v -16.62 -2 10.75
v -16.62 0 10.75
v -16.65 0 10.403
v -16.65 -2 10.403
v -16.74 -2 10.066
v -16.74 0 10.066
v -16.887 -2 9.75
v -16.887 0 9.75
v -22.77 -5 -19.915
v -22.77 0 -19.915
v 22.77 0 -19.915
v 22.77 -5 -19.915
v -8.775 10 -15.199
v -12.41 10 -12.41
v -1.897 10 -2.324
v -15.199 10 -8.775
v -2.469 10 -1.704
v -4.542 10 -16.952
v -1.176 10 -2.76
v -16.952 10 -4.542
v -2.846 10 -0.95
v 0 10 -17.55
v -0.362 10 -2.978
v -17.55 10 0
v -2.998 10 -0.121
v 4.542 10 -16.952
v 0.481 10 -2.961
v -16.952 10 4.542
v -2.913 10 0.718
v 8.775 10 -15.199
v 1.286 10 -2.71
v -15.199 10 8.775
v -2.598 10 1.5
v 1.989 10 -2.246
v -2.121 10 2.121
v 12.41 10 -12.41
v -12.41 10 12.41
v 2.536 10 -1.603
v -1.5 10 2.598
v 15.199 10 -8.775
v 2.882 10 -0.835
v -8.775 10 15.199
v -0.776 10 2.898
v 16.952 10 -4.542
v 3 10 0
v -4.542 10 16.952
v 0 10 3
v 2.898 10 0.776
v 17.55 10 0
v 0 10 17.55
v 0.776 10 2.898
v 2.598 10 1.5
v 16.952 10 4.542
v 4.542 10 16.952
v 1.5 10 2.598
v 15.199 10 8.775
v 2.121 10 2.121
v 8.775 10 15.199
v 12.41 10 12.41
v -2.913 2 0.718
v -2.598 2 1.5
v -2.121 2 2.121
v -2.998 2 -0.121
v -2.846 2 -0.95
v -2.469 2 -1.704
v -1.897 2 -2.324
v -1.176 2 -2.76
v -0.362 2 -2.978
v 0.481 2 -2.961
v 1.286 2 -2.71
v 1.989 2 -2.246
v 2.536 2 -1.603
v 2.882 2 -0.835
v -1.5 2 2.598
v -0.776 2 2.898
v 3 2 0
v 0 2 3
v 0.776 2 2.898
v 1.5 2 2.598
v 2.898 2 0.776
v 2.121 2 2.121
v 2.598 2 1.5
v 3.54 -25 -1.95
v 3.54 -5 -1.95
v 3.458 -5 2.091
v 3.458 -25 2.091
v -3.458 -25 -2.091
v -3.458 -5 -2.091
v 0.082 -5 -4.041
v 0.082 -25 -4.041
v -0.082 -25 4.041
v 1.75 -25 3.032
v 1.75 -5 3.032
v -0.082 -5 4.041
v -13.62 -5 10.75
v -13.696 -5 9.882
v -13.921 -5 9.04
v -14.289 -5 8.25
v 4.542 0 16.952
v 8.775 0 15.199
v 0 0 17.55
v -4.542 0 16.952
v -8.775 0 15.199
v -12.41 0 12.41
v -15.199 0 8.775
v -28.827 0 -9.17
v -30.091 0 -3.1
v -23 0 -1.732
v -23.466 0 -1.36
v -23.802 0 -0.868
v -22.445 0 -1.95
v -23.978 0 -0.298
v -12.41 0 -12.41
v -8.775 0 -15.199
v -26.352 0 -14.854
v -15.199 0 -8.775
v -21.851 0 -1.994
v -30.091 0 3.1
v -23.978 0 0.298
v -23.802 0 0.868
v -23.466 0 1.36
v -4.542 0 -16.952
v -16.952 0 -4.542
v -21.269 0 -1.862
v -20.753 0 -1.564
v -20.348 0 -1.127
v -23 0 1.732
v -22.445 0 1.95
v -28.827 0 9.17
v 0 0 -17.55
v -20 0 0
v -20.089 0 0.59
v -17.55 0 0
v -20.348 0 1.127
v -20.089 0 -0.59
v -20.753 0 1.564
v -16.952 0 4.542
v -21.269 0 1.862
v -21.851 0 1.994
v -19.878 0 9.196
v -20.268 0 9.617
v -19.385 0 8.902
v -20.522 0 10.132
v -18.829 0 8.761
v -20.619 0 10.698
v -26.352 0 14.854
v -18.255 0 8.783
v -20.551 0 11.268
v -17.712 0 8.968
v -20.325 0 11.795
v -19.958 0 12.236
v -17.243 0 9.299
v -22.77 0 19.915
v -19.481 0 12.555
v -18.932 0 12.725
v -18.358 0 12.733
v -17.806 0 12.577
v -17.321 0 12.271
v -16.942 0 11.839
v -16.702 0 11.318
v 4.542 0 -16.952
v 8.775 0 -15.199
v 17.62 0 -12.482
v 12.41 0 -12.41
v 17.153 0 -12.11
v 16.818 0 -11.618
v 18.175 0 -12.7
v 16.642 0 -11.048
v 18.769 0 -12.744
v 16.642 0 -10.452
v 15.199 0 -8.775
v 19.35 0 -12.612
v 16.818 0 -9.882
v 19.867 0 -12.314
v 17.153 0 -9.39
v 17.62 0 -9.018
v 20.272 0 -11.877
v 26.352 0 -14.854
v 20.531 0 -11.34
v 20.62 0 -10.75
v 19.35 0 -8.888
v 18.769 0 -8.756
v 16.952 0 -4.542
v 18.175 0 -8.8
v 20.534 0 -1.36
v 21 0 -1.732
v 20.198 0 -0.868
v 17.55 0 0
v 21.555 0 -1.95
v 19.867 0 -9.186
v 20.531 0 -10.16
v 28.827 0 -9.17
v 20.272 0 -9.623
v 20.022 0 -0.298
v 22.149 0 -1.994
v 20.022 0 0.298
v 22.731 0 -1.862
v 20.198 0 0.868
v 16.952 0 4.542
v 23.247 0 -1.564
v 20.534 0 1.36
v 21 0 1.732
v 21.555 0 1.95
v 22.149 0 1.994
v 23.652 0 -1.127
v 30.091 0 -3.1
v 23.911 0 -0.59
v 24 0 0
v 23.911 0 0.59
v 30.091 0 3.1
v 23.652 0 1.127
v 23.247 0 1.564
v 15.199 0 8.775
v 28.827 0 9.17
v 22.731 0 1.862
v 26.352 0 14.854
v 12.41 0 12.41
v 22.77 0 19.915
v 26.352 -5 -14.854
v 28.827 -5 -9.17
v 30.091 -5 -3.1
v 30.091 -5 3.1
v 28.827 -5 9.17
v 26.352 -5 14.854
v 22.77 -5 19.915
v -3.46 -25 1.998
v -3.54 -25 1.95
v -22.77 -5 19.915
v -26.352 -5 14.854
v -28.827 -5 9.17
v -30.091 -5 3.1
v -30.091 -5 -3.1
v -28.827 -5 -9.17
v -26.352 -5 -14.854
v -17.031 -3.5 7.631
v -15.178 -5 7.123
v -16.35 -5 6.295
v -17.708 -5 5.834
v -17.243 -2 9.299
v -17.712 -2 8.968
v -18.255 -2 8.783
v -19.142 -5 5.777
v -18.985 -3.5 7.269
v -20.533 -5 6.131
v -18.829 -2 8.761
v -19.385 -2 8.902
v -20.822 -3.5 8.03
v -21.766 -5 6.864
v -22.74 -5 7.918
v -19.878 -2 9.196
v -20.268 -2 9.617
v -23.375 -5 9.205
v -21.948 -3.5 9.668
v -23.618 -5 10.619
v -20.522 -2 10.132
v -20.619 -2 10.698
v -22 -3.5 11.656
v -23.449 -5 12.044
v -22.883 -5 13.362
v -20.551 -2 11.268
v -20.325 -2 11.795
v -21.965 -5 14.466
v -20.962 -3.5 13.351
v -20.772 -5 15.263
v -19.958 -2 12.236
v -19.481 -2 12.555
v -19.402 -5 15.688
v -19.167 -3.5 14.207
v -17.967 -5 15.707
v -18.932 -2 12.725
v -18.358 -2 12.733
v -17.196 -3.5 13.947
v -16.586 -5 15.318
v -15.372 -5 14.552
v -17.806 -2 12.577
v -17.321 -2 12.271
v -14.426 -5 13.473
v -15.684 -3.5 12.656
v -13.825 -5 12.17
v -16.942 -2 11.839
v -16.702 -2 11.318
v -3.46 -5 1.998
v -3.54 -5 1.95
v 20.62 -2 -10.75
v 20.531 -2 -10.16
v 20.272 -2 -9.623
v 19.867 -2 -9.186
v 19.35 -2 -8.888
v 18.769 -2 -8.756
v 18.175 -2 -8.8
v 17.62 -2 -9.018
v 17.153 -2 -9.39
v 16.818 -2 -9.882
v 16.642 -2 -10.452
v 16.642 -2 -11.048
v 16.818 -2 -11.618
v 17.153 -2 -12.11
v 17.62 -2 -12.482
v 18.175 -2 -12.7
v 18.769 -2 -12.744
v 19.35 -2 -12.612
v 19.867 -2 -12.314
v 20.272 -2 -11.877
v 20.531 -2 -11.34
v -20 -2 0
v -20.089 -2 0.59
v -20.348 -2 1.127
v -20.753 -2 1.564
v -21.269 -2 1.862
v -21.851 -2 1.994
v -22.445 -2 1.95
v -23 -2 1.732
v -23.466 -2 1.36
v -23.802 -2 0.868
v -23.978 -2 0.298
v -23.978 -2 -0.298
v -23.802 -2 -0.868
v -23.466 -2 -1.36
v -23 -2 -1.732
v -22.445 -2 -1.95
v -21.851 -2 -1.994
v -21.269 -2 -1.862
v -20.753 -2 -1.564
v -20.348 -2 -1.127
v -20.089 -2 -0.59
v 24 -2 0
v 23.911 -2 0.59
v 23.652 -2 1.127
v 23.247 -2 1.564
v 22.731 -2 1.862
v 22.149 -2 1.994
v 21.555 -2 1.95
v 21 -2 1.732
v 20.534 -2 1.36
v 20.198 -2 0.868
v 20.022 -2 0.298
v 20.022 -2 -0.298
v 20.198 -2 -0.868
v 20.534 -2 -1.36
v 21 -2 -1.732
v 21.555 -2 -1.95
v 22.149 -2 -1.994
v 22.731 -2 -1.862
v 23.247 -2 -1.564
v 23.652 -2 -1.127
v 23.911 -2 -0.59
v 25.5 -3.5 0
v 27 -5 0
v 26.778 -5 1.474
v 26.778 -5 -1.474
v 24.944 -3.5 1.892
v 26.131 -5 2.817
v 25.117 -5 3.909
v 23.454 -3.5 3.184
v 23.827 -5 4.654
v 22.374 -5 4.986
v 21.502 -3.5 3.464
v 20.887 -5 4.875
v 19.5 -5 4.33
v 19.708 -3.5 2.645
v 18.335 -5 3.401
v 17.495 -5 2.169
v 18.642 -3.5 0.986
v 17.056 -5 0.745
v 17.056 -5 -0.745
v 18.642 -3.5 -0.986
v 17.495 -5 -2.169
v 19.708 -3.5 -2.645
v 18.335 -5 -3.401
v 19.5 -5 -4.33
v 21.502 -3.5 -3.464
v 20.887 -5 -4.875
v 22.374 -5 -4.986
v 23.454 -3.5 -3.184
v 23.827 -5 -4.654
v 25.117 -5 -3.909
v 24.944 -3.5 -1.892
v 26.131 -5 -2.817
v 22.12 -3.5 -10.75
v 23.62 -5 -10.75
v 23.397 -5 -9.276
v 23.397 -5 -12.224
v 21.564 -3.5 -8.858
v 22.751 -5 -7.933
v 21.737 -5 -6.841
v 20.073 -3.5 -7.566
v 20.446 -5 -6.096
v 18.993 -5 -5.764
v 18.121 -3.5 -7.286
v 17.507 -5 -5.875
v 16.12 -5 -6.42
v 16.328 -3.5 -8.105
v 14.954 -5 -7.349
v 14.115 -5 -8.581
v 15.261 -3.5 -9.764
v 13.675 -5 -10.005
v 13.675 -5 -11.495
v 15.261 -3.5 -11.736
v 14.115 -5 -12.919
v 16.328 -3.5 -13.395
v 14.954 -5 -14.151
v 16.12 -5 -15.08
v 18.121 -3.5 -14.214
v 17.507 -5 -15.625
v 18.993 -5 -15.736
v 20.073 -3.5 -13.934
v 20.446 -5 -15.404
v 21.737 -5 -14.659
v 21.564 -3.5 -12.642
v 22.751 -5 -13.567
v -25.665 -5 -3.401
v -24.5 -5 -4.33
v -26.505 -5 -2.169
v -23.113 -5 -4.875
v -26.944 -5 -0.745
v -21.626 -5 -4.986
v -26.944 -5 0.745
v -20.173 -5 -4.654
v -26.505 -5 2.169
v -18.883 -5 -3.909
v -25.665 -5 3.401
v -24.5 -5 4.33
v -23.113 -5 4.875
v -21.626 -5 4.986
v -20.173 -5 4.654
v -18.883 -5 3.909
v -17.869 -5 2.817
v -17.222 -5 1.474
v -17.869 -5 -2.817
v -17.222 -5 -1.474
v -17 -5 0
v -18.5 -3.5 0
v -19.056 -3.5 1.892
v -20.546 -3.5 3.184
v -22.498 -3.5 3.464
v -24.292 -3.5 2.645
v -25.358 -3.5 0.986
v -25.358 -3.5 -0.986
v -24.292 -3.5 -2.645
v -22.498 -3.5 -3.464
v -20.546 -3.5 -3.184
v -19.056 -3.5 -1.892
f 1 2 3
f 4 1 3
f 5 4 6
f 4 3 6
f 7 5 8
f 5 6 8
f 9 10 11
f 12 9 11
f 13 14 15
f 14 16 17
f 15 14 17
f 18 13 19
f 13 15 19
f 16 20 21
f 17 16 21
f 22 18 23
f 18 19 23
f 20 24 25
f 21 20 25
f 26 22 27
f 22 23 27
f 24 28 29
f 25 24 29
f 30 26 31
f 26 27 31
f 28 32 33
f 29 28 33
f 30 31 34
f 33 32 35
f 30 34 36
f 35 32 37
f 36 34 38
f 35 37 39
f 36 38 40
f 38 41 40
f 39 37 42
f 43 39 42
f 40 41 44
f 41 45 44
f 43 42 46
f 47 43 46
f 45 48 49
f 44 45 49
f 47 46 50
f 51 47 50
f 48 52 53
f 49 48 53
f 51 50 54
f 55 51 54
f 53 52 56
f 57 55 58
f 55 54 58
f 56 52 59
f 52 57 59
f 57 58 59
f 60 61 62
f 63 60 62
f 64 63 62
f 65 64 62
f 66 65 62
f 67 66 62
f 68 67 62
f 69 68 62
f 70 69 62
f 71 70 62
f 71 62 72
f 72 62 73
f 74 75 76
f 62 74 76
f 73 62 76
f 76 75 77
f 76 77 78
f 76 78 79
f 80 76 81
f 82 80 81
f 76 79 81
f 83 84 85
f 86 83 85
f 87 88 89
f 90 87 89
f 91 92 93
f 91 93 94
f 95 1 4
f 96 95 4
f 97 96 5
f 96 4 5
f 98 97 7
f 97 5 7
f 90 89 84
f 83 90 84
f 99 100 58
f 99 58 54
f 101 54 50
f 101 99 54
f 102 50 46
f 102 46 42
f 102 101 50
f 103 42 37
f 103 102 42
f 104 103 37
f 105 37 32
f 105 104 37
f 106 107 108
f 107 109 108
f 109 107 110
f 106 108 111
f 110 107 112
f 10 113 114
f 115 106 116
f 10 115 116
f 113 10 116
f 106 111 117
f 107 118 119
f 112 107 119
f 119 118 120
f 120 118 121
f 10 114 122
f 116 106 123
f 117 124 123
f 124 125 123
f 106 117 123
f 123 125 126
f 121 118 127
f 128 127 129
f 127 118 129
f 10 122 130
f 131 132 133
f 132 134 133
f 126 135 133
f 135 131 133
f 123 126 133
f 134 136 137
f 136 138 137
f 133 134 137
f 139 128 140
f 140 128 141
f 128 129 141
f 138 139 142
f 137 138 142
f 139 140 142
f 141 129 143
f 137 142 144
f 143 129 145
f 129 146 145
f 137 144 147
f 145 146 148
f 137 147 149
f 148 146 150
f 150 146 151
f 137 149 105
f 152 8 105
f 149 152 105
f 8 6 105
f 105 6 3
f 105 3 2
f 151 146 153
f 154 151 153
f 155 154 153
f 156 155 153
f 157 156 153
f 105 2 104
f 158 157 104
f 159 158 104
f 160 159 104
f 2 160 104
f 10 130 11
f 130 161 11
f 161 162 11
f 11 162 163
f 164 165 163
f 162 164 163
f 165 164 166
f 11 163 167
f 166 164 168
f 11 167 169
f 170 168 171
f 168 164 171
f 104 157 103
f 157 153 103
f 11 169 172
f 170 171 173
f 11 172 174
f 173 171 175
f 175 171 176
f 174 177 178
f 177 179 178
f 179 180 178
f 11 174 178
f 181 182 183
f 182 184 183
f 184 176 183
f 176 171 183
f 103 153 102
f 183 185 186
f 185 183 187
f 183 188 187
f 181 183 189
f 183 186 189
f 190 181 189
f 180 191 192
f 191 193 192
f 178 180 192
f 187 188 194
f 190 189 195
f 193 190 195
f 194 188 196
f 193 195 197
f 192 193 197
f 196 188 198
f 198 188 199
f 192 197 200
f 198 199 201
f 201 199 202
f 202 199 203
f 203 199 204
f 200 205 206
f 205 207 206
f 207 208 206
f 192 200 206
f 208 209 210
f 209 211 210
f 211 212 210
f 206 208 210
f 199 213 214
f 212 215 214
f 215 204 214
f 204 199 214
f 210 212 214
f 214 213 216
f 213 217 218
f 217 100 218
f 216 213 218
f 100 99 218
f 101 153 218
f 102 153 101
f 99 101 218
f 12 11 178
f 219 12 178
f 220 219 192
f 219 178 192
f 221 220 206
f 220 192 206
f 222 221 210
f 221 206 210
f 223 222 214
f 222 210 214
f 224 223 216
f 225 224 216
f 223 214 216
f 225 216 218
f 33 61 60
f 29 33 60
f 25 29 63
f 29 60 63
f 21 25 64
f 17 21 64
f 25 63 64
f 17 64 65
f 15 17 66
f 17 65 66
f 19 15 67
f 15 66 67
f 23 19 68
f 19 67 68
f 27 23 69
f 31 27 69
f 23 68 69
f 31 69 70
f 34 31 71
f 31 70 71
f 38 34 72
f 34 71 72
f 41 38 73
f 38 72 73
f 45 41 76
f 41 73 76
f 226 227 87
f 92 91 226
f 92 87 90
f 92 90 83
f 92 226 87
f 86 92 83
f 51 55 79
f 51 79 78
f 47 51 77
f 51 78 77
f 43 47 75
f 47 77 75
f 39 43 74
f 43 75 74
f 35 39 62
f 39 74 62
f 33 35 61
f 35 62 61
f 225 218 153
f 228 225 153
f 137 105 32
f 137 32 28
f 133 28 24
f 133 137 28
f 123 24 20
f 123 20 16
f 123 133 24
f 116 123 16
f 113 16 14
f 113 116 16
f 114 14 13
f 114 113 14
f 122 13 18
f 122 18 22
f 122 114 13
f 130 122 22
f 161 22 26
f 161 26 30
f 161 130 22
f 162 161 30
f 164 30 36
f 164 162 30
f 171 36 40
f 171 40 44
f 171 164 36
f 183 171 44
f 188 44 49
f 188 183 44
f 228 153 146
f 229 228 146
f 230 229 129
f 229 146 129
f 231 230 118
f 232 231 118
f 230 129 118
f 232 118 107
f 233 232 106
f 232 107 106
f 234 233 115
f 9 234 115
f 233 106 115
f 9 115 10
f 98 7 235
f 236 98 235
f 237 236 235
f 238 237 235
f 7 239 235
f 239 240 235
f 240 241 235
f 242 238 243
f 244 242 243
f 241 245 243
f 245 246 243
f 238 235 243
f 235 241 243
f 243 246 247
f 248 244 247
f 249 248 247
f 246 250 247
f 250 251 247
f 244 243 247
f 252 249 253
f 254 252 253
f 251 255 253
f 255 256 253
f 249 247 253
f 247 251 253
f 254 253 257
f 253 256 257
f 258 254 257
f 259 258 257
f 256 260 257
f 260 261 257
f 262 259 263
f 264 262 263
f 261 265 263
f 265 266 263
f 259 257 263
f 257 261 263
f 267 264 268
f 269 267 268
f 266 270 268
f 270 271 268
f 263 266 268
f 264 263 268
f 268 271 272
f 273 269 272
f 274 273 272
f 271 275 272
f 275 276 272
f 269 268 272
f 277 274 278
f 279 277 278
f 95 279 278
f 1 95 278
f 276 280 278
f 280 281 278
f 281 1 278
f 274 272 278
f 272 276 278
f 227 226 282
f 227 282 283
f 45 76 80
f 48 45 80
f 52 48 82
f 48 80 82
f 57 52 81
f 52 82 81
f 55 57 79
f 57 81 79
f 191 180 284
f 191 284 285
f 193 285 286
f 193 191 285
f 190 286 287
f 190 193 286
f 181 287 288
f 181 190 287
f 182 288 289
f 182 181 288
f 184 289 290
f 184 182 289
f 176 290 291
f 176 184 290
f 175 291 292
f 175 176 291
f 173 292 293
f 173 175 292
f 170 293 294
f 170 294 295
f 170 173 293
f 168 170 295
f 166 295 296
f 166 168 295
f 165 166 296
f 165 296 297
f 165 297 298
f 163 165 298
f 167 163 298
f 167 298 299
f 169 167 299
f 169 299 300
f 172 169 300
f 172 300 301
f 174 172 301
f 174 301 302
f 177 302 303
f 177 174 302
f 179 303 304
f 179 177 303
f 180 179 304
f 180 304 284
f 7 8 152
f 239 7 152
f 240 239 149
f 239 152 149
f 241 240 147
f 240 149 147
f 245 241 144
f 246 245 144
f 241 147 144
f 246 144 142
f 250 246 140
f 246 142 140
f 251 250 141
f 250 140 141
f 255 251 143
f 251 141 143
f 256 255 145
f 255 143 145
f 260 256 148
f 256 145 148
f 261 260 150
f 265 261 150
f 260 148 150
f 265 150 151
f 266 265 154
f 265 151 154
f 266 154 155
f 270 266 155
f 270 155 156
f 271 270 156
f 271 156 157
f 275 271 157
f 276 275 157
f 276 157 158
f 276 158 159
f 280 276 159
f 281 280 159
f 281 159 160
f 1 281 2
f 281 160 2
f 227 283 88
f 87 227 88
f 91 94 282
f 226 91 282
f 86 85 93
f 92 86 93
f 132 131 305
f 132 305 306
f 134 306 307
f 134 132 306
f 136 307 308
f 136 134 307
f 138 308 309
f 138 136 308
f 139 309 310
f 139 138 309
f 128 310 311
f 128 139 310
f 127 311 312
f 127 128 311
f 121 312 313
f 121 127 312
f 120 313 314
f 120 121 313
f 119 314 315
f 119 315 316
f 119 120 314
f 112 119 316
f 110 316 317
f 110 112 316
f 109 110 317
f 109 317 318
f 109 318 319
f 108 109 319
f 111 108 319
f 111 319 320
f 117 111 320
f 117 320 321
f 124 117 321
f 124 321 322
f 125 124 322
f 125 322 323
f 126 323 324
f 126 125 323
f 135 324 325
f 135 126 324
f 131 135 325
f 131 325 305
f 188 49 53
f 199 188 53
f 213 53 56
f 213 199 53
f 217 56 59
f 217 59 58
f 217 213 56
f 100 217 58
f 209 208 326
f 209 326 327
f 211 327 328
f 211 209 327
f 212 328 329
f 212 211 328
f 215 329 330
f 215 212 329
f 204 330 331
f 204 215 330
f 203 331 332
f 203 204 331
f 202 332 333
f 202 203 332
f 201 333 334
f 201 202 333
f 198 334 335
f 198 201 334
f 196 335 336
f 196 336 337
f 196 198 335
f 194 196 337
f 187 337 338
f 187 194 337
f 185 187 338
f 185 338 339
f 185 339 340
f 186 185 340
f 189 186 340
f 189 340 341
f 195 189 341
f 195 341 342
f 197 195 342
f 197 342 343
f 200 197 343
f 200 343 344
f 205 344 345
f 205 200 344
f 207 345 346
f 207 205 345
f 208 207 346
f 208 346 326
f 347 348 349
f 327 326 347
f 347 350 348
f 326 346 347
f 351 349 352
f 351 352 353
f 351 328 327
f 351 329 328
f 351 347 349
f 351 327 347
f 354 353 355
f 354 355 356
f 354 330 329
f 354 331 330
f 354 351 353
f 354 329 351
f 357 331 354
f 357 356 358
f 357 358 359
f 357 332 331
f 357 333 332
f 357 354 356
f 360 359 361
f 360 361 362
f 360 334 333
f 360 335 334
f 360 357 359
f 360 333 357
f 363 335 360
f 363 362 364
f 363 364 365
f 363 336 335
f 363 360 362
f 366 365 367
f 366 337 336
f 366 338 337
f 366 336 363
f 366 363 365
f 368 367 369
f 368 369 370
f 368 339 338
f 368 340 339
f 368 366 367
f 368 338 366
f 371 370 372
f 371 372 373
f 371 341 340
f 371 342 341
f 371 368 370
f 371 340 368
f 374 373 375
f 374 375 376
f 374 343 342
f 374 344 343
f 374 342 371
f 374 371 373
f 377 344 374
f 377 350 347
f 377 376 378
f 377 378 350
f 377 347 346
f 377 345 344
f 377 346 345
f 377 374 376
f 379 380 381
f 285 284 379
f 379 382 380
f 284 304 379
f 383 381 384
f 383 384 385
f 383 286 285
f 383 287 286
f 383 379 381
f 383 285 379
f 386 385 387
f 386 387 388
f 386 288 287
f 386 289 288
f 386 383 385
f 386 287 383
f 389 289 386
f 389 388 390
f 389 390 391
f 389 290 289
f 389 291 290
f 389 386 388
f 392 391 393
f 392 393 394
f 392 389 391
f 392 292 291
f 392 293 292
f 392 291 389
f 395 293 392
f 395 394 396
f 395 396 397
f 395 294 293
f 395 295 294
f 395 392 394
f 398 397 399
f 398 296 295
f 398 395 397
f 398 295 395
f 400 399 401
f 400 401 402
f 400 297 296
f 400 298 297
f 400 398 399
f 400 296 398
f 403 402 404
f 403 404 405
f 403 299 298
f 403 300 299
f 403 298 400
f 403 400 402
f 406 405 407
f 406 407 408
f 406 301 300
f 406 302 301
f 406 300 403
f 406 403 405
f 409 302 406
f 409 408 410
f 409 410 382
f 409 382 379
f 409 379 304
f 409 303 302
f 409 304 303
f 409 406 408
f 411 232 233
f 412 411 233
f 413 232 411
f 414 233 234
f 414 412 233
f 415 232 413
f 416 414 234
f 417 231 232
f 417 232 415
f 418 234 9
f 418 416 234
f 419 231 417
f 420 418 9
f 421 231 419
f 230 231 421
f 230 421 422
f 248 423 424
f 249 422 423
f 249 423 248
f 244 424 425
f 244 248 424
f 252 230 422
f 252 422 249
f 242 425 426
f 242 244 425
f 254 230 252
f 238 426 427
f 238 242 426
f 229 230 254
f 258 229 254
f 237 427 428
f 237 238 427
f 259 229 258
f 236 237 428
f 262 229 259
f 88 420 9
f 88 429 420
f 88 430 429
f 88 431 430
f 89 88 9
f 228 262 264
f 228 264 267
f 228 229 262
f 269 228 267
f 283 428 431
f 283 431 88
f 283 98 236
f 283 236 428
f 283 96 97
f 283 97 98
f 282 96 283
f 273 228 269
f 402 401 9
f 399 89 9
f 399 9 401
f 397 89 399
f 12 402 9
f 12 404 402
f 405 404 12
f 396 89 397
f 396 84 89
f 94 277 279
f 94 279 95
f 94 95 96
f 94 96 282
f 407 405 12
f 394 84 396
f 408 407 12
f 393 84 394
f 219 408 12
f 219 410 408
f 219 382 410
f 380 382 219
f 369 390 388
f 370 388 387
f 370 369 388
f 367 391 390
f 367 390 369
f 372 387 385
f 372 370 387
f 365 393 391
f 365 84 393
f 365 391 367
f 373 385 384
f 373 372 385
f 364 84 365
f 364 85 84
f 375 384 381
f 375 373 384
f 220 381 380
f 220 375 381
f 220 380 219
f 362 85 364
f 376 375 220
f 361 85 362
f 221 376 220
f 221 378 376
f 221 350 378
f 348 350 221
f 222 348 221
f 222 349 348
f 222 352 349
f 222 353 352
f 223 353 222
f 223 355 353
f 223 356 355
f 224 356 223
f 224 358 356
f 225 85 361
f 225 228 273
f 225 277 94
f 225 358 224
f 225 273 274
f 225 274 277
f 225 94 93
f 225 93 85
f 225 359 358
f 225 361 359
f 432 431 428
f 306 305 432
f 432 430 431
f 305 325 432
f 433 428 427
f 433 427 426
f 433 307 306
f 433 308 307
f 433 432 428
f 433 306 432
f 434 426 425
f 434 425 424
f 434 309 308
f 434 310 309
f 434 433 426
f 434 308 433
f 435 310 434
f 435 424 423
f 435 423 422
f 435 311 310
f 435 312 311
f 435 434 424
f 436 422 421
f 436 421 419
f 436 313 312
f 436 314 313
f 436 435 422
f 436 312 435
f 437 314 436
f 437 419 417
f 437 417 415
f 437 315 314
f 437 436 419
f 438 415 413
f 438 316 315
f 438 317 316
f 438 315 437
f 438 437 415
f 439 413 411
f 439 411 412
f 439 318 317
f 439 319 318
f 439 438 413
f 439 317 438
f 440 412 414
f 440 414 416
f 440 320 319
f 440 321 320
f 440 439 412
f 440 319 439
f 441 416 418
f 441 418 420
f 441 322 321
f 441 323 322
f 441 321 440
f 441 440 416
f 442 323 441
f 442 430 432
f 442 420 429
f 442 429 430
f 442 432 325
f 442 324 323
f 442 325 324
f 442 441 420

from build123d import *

# Parameters (mm, degrees)
F0_R          = 2
F1_DEPTH      = 5
F2_DEPTH      = 5
F2_DEPTH_BACK = 10
F3_SIZE       = 3
F4_DEPTH      = 25
F5_START      = -2
F5_DEPTH      = 8


with BuildPart() as f1:
    # F0 (on Front) → F1 (new body)
    with BuildSketch(Plane.XZ):
        with BuildLine():
            ThreePointArc((22.7699238258, -19.9146445855), (28.3183041135, -10.6365479426), (30.25, 0))
            ThreePointArc((30.25, 0), (28.3183041135, 10.6365479426), (22.7699238258, 19.9146445855))
            Line((22.7699238258, 19.9146445855), (-22.7699238258, 19.9146445855))
            ThreePointArc((-22.7699238258, 19.9146445855), (-30.25, 0), (-22.7699238258, -19.9146445855))
            Line((-22.7699238258, -19.9146445855), (22.7699238258, -19.9146445855))
        make_face()
        with Locations((18.6195461814, -10.75)):
            Circle(F0_R, mode=Mode.SUBTRACT)
        with Locations((-22, 0)):
            Circle(F0_R, mode=Mode.SUBTRACT)
        with BuildLine():
            ThreePointArc((-16.6195461814, 10.75), (-16.6876945288, 10.2323619098), (-16.8874953738, 9.75))
            ThreePointArc((-16.8874953738, 9.75), (-20.5513978339, 11.2676380902), (-16.6195461814, 10.75))
        make_face(mode=Mode.SUBTRACT)
        with BuildLine():
            ThreePointArc((8.775, 15.1987458364), (15.1987458364, 8.775), (17.55, 0))
            ThreePointArc((17.55, 0), (-4.5422742415, -16.9519982514), (-15.1987458364, 8.775))
            ThreePointArc((-15.1987458364, 8.775), (-4.5422742415, 16.9519982514), (8.775, 15.1987458364))
        make_face(mode=Mode.SUBTRACT)
        with Locations((22, 0)):
            Circle(F0_R, mode=Mode.SUBTRACT)
        with BuildLine():
            ThreePointArc((-15.1987458364, 8.775), (-4.5422742415, -16.9519982514), (17.55, 0))
            ThreePointArc((17.55, 0), (15.1987458364, 8.775), (8.775, 15.1987458364))
            Line((8.775, 15.1987458364), (1.7503574183, 3.0317079799))
            Line((1.7503574183, 3.0317079799), (3.4584509937, 2.0910404247))
            Line((3.4584509937, 2.0910404247), (3.540119625, -1.9495862059))
            Line((3.540119625, -1.9495862059), (0.0816686313, -4.0406266306))
            Line((0.0816686313, -4.0406266306), (-3.4584509937, -2.0910404247))
            Line((-3.4584509937, -2.0910404247), (-3.540119625, 1.9495862059))
            Line((-3.540119625, 1.9495862059), (-3.4603350445, 1.9978253694))
            Line((-3.4603350445, 1.9978253694), (-15.1987458364, 8.775))
        make_face()
        with BuildLine():
            Line((1.7503574183, 3.0317079799), (8.775, 15.1987458364))
            ThreePointArc((8.775, 15.1987458364), (-4.5422742415, 16.9519982514), (-15.1987458364, 8.775))
            Line((-15.1987458364, 8.775), (-3.4603350445, 1.9978253694))
            Line((-3.4603350445, 1.9978253694), (-0.0816686313, 4.0406266306))
            Line((-0.0816686313, 4.0406266306), (1.7503574183, 3.0317079799))
        make_face()
        with BuildLine():
            Line((3.4584509937, 2.0910404247), (1.7503574183, 3.0317079799))
            Line((1.7503574183, 3.0317079799), (1.5, 2.5980762114))
            ThreePointArc((1.5, 2.5980762114), (2.5980762114, 1.5), (3, 0))
            ThreePointArc((3, 0), (-0.7764571353, -2.8977774789), (-2.5980762114, 1.5))
            Line((-2.5980762114, 1.5), (-3.4603350445, 1.9978253694))
            Line((-3.4603350445, 1.9978253694), (-3.540119625, 1.9495862059))
            Line((-3.540119625, 1.9495862059), (-3.4584509937, -2.0910404247))
            Line((-3.4584509937, -2.0910404247), (0.0816686313, -4.0406266306))
            Line((0.0816686313, -4.0406266306), (3.540119625, -1.9495862059))
            Line((3.540119625, -1.9495862059), (3.4584509937, 2.0910404247))
        make_face()
        with BuildLine():
            Line((0, 0), (1.5, 2.5980762114))
            ThreePointArc((1.5, 2.5980762114), (-0.7764571353, 2.8977774789), (-2.5980762114, 1.5))
            Line((-2.5980762114, 1.5), (0, 0))
        make_face()
        with BuildLine():
            Line((1.5, 2.5980762114), (1.7503574183, 3.0317079799))
            Line((1.7503574183, 3.0317079799), (-0.0816686313, 4.0406266306))
            Line((-0.0816686313, 4.0406266306), (-3.4603350445, 1.9978253694))
            Line((-3.4603350445, 1.9978253694), (-2.5980762114, 1.5))
            ThreePointArc((-2.5980762114, 1.5), (-0.7764571353, 2.8977774789), (1.5, 2.5980762114))
        make_face()
        with BuildLine():
            ThreePointArc((3, 0), (2.5980762114, 1.5), (1.5, 2.5980762114))
            Line((1.5, 2.5980762114), (0, 0))
            Line((0, 0), (-2.5980762114, 1.5))
            ThreePointArc((-2.5980762114, 1.5), (-0.7764571353, -2.8977774789), (3, 0))
        make_face()
    extrude(amount=F1_DEPTH)

    # F0 (on Front) → F2 (join, two sides)
    with BuildSketch(Plane.XZ) as f2_sk:
        with BuildLine():
            Line((0, 0), (1.5, 2.5980762114))
            ThreePointArc((1.5, 2.5980762114), (-0.7764571353, 2.8977774789), (-2.5980762114, 1.5))
            Line((-2.5980762114, 1.5), (0, 0))
        make_face()
        with BuildLine():
            ThreePointArc((3, 0), (2.5980762114, 1.5), (1.5, 2.5980762114))
            Line((1.5, 2.5980762114), (0, 0))
            Line((0, 0), (-2.5980762114, 1.5))
            ThreePointArc((-2.5980762114, 1.5), (-0.7764571353, -2.8977774789), (3, 0))
        make_face()
        with BuildLine():
            Line((3.4584509937, 2.0910404247), (1.7503574183, 3.0317079799))
            Line((1.7503574183, 3.0317079799), (1.5, 2.5980762114))
            ThreePointArc((1.5, 2.5980762114), (2.5980762114, 1.5), (3, 0))
            ThreePointArc((3, 0), (-0.7764571353, -2.8977774789), (-2.5980762114, 1.5))
            Line((-2.5980762114, 1.5), (-3.4603350445, 1.9978253694))
            Line((-3.4603350445, 1.9978253694), (-3.540119625, 1.9495862059))
            Line((-3.540119625, 1.9495862059), (-3.4584509937, -2.0910404247))
            Line((-3.4584509937, -2.0910404247), (0.0816686313, -4.0406266306))
            Line((0.0816686313, -4.0406266306), (3.540119625, -1.9495862059))
            Line((3.540119625, -1.9495862059), (3.4584509937, 2.0910404247))
        make_face()
        with BuildLine():
            Line((1.5, 2.5980762114), (1.7503574183, 3.0317079799))
            Line((1.7503574183, 3.0317079799), (-0.0816686313, 4.0406266306))
            Line((-0.0816686313, 4.0406266306), (-3.4603350445, 1.9978253694))
            Line((-3.4603350445, 1.9978253694), (-2.5980762114, 1.5))
            ThreePointArc((-2.5980762114, 1.5), (-0.7764571353, 2.8977774789), (1.5, 2.5980762114))
        make_face()
        with BuildLine():
            ThreePointArc((-15.1987458364, 8.775), (-4.5422742415, -16.9519982514), (17.55, 0))
            ThreePointArc((17.55, 0), (15.1987458364, 8.775), (8.775, 15.1987458364))
            Line((8.775, 15.1987458364), (1.7503574183, 3.0317079799))
            Line((1.7503574183, 3.0317079799), (3.4584509937, 2.0910404247))
            Line((3.4584509937, 2.0910404247), (3.540119625, -1.9495862059))
            Line((3.540119625, -1.9495862059), (0.0816686313, -4.0406266306))
            Line((0.0816686313, -4.0406266306), (-3.4584509937, -2.0910404247))
            Line((-3.4584509937, -2.0910404247), (-3.540119625, 1.9495862059))
            Line((-3.540119625, 1.9495862059), (-3.4603350445, 1.9978253694))
            Line((-3.4603350445, 1.9978253694), (-15.1987458364, 8.775))
        make_face()
        with BuildLine():
            Line((1.7503574183, 3.0317079799), (8.775, 15.1987458364))
            ThreePointArc((8.775, 15.1987458364), (-4.5422742415, 16.9519982514), (-15.1987458364, 8.775))
            Line((-15.1987458364, 8.775), (-3.4603350445, 1.9978253694))
            Line((-3.4603350445, 1.9978253694), (-0.0816686313, 4.0406266306))
            Line((-0.0816686313, 4.0406266306), (1.7503574183, 3.0317079799))
        make_face()
    extrude(amount=F2_DEPTH)
    extrude(f2_sk.sketch, amount=-F2_DEPTH_BACK)

    # F3
    f3_edges = [f1.edges().sort_by_distance(p)[0] for p in [
        (-20.619546, -5, 10.75),
        (16.619546, -5, -10.75),
        (20, -5, 0),
        (-24, -5, 0),
    ]]
    chamfer(f3_edges, length=F3_SIZE)

    # F0 (on Front) → F4 (join)
    with BuildSketch(Plane.XZ):
        with BuildLine():
            Line((1.5, 2.5980762114), (1.7503574183, 3.0317079799))
            Line((1.7503574183, 3.0317079799), (-0.0816686313, 4.0406266306))
            Line((-0.0816686313, 4.0406266306), (-3.4603350445, 1.9978253694))
            Line((-3.4603350445, 1.9978253694), (-2.5980762114, 1.5))
            ThreePointArc((-2.5980762114, 1.5), (-0.7764571353, 2.8977774789), (1.5, 2.5980762114))
        make_face()
        with BuildLine():
            Line((3.4584509937, 2.0910404247), (1.7503574183, 3.0317079799))
            Line((1.7503574183, 3.0317079799), (1.5, 2.5980762114))
            ThreePointArc((1.5, 2.5980762114), (2.5980762114, 1.5), (3, 0))
            ThreePointArc((3, 0), (-0.7764571353, -2.8977774789), (-2.5980762114, 1.5))
            Line((-2.5980762114, 1.5), (-3.4603350445, 1.9978253694))
            Line((-3.4603350445, 1.9978253694), (-3.540119625, 1.9495862059))
            Line((-3.540119625, 1.9495862059), (-3.4584509937, -2.0910404247))
            Line((-3.4584509937, -2.0910404247), (0.0816686313, -4.0406266306))
            Line((0.0816686313, -4.0406266306), (3.540119625, -1.9495862059))
            Line((3.540119625, -1.9495862059), (3.4584509937, 2.0910404247))
        make_face()
        with BuildLine():
            ThreePointArc((3, 0), (2.5980762114, 1.5), (1.5, 2.5980762114))
            Line((1.5, 2.5980762114), (0, 0))
            Line((0, 0), (-2.5980762114, 1.5))
            ThreePointArc((-2.5980762114, 1.5), (-0.7764571353, -2.8977774789), (3, 0))
        make_face()
        with BuildLine():
            Line((0, 0), (1.5, 2.5980762114))
            ThreePointArc((1.5, 2.5980762114), (-0.7764571353, 2.8977774789), (-2.5980762114, 1.5))
            Line((-2.5980762114, 1.5), (0, 0))
        make_face()
    extrude(amount=F4_DEPTH)

    # F0 (on Front) → F5 (cut)
    with BuildSketch(Plane.XZ.offset(F5_START)):
        with BuildLine():
            ThreePointArc((3, 0), (2.5980762114, 1.5), (1.5, 2.5980762114))
            Line((1.5, 2.5980762114), (0, 0))
            Line((0, 0), (-2.5980762114, 1.5))
            ThreePointArc((-2.5980762114, 1.5), (-0.7764571353, -2.8977774789), (3, 0))
        make_face()
        with BuildLine():
            Line((0, 0), (1.5, 2.5980762114))
            ThreePointArc((1.5, 2.5980762114), (-0.7764571353, 2.8977774789), (-2.5980762114, 1.5))
            Line((-2.5980762114, 1.5), (0, 0))
        make_face()
    extrude(amount=-F5_DEPTH, mode=Mode.SUBTRACT)


solid = f1.part
